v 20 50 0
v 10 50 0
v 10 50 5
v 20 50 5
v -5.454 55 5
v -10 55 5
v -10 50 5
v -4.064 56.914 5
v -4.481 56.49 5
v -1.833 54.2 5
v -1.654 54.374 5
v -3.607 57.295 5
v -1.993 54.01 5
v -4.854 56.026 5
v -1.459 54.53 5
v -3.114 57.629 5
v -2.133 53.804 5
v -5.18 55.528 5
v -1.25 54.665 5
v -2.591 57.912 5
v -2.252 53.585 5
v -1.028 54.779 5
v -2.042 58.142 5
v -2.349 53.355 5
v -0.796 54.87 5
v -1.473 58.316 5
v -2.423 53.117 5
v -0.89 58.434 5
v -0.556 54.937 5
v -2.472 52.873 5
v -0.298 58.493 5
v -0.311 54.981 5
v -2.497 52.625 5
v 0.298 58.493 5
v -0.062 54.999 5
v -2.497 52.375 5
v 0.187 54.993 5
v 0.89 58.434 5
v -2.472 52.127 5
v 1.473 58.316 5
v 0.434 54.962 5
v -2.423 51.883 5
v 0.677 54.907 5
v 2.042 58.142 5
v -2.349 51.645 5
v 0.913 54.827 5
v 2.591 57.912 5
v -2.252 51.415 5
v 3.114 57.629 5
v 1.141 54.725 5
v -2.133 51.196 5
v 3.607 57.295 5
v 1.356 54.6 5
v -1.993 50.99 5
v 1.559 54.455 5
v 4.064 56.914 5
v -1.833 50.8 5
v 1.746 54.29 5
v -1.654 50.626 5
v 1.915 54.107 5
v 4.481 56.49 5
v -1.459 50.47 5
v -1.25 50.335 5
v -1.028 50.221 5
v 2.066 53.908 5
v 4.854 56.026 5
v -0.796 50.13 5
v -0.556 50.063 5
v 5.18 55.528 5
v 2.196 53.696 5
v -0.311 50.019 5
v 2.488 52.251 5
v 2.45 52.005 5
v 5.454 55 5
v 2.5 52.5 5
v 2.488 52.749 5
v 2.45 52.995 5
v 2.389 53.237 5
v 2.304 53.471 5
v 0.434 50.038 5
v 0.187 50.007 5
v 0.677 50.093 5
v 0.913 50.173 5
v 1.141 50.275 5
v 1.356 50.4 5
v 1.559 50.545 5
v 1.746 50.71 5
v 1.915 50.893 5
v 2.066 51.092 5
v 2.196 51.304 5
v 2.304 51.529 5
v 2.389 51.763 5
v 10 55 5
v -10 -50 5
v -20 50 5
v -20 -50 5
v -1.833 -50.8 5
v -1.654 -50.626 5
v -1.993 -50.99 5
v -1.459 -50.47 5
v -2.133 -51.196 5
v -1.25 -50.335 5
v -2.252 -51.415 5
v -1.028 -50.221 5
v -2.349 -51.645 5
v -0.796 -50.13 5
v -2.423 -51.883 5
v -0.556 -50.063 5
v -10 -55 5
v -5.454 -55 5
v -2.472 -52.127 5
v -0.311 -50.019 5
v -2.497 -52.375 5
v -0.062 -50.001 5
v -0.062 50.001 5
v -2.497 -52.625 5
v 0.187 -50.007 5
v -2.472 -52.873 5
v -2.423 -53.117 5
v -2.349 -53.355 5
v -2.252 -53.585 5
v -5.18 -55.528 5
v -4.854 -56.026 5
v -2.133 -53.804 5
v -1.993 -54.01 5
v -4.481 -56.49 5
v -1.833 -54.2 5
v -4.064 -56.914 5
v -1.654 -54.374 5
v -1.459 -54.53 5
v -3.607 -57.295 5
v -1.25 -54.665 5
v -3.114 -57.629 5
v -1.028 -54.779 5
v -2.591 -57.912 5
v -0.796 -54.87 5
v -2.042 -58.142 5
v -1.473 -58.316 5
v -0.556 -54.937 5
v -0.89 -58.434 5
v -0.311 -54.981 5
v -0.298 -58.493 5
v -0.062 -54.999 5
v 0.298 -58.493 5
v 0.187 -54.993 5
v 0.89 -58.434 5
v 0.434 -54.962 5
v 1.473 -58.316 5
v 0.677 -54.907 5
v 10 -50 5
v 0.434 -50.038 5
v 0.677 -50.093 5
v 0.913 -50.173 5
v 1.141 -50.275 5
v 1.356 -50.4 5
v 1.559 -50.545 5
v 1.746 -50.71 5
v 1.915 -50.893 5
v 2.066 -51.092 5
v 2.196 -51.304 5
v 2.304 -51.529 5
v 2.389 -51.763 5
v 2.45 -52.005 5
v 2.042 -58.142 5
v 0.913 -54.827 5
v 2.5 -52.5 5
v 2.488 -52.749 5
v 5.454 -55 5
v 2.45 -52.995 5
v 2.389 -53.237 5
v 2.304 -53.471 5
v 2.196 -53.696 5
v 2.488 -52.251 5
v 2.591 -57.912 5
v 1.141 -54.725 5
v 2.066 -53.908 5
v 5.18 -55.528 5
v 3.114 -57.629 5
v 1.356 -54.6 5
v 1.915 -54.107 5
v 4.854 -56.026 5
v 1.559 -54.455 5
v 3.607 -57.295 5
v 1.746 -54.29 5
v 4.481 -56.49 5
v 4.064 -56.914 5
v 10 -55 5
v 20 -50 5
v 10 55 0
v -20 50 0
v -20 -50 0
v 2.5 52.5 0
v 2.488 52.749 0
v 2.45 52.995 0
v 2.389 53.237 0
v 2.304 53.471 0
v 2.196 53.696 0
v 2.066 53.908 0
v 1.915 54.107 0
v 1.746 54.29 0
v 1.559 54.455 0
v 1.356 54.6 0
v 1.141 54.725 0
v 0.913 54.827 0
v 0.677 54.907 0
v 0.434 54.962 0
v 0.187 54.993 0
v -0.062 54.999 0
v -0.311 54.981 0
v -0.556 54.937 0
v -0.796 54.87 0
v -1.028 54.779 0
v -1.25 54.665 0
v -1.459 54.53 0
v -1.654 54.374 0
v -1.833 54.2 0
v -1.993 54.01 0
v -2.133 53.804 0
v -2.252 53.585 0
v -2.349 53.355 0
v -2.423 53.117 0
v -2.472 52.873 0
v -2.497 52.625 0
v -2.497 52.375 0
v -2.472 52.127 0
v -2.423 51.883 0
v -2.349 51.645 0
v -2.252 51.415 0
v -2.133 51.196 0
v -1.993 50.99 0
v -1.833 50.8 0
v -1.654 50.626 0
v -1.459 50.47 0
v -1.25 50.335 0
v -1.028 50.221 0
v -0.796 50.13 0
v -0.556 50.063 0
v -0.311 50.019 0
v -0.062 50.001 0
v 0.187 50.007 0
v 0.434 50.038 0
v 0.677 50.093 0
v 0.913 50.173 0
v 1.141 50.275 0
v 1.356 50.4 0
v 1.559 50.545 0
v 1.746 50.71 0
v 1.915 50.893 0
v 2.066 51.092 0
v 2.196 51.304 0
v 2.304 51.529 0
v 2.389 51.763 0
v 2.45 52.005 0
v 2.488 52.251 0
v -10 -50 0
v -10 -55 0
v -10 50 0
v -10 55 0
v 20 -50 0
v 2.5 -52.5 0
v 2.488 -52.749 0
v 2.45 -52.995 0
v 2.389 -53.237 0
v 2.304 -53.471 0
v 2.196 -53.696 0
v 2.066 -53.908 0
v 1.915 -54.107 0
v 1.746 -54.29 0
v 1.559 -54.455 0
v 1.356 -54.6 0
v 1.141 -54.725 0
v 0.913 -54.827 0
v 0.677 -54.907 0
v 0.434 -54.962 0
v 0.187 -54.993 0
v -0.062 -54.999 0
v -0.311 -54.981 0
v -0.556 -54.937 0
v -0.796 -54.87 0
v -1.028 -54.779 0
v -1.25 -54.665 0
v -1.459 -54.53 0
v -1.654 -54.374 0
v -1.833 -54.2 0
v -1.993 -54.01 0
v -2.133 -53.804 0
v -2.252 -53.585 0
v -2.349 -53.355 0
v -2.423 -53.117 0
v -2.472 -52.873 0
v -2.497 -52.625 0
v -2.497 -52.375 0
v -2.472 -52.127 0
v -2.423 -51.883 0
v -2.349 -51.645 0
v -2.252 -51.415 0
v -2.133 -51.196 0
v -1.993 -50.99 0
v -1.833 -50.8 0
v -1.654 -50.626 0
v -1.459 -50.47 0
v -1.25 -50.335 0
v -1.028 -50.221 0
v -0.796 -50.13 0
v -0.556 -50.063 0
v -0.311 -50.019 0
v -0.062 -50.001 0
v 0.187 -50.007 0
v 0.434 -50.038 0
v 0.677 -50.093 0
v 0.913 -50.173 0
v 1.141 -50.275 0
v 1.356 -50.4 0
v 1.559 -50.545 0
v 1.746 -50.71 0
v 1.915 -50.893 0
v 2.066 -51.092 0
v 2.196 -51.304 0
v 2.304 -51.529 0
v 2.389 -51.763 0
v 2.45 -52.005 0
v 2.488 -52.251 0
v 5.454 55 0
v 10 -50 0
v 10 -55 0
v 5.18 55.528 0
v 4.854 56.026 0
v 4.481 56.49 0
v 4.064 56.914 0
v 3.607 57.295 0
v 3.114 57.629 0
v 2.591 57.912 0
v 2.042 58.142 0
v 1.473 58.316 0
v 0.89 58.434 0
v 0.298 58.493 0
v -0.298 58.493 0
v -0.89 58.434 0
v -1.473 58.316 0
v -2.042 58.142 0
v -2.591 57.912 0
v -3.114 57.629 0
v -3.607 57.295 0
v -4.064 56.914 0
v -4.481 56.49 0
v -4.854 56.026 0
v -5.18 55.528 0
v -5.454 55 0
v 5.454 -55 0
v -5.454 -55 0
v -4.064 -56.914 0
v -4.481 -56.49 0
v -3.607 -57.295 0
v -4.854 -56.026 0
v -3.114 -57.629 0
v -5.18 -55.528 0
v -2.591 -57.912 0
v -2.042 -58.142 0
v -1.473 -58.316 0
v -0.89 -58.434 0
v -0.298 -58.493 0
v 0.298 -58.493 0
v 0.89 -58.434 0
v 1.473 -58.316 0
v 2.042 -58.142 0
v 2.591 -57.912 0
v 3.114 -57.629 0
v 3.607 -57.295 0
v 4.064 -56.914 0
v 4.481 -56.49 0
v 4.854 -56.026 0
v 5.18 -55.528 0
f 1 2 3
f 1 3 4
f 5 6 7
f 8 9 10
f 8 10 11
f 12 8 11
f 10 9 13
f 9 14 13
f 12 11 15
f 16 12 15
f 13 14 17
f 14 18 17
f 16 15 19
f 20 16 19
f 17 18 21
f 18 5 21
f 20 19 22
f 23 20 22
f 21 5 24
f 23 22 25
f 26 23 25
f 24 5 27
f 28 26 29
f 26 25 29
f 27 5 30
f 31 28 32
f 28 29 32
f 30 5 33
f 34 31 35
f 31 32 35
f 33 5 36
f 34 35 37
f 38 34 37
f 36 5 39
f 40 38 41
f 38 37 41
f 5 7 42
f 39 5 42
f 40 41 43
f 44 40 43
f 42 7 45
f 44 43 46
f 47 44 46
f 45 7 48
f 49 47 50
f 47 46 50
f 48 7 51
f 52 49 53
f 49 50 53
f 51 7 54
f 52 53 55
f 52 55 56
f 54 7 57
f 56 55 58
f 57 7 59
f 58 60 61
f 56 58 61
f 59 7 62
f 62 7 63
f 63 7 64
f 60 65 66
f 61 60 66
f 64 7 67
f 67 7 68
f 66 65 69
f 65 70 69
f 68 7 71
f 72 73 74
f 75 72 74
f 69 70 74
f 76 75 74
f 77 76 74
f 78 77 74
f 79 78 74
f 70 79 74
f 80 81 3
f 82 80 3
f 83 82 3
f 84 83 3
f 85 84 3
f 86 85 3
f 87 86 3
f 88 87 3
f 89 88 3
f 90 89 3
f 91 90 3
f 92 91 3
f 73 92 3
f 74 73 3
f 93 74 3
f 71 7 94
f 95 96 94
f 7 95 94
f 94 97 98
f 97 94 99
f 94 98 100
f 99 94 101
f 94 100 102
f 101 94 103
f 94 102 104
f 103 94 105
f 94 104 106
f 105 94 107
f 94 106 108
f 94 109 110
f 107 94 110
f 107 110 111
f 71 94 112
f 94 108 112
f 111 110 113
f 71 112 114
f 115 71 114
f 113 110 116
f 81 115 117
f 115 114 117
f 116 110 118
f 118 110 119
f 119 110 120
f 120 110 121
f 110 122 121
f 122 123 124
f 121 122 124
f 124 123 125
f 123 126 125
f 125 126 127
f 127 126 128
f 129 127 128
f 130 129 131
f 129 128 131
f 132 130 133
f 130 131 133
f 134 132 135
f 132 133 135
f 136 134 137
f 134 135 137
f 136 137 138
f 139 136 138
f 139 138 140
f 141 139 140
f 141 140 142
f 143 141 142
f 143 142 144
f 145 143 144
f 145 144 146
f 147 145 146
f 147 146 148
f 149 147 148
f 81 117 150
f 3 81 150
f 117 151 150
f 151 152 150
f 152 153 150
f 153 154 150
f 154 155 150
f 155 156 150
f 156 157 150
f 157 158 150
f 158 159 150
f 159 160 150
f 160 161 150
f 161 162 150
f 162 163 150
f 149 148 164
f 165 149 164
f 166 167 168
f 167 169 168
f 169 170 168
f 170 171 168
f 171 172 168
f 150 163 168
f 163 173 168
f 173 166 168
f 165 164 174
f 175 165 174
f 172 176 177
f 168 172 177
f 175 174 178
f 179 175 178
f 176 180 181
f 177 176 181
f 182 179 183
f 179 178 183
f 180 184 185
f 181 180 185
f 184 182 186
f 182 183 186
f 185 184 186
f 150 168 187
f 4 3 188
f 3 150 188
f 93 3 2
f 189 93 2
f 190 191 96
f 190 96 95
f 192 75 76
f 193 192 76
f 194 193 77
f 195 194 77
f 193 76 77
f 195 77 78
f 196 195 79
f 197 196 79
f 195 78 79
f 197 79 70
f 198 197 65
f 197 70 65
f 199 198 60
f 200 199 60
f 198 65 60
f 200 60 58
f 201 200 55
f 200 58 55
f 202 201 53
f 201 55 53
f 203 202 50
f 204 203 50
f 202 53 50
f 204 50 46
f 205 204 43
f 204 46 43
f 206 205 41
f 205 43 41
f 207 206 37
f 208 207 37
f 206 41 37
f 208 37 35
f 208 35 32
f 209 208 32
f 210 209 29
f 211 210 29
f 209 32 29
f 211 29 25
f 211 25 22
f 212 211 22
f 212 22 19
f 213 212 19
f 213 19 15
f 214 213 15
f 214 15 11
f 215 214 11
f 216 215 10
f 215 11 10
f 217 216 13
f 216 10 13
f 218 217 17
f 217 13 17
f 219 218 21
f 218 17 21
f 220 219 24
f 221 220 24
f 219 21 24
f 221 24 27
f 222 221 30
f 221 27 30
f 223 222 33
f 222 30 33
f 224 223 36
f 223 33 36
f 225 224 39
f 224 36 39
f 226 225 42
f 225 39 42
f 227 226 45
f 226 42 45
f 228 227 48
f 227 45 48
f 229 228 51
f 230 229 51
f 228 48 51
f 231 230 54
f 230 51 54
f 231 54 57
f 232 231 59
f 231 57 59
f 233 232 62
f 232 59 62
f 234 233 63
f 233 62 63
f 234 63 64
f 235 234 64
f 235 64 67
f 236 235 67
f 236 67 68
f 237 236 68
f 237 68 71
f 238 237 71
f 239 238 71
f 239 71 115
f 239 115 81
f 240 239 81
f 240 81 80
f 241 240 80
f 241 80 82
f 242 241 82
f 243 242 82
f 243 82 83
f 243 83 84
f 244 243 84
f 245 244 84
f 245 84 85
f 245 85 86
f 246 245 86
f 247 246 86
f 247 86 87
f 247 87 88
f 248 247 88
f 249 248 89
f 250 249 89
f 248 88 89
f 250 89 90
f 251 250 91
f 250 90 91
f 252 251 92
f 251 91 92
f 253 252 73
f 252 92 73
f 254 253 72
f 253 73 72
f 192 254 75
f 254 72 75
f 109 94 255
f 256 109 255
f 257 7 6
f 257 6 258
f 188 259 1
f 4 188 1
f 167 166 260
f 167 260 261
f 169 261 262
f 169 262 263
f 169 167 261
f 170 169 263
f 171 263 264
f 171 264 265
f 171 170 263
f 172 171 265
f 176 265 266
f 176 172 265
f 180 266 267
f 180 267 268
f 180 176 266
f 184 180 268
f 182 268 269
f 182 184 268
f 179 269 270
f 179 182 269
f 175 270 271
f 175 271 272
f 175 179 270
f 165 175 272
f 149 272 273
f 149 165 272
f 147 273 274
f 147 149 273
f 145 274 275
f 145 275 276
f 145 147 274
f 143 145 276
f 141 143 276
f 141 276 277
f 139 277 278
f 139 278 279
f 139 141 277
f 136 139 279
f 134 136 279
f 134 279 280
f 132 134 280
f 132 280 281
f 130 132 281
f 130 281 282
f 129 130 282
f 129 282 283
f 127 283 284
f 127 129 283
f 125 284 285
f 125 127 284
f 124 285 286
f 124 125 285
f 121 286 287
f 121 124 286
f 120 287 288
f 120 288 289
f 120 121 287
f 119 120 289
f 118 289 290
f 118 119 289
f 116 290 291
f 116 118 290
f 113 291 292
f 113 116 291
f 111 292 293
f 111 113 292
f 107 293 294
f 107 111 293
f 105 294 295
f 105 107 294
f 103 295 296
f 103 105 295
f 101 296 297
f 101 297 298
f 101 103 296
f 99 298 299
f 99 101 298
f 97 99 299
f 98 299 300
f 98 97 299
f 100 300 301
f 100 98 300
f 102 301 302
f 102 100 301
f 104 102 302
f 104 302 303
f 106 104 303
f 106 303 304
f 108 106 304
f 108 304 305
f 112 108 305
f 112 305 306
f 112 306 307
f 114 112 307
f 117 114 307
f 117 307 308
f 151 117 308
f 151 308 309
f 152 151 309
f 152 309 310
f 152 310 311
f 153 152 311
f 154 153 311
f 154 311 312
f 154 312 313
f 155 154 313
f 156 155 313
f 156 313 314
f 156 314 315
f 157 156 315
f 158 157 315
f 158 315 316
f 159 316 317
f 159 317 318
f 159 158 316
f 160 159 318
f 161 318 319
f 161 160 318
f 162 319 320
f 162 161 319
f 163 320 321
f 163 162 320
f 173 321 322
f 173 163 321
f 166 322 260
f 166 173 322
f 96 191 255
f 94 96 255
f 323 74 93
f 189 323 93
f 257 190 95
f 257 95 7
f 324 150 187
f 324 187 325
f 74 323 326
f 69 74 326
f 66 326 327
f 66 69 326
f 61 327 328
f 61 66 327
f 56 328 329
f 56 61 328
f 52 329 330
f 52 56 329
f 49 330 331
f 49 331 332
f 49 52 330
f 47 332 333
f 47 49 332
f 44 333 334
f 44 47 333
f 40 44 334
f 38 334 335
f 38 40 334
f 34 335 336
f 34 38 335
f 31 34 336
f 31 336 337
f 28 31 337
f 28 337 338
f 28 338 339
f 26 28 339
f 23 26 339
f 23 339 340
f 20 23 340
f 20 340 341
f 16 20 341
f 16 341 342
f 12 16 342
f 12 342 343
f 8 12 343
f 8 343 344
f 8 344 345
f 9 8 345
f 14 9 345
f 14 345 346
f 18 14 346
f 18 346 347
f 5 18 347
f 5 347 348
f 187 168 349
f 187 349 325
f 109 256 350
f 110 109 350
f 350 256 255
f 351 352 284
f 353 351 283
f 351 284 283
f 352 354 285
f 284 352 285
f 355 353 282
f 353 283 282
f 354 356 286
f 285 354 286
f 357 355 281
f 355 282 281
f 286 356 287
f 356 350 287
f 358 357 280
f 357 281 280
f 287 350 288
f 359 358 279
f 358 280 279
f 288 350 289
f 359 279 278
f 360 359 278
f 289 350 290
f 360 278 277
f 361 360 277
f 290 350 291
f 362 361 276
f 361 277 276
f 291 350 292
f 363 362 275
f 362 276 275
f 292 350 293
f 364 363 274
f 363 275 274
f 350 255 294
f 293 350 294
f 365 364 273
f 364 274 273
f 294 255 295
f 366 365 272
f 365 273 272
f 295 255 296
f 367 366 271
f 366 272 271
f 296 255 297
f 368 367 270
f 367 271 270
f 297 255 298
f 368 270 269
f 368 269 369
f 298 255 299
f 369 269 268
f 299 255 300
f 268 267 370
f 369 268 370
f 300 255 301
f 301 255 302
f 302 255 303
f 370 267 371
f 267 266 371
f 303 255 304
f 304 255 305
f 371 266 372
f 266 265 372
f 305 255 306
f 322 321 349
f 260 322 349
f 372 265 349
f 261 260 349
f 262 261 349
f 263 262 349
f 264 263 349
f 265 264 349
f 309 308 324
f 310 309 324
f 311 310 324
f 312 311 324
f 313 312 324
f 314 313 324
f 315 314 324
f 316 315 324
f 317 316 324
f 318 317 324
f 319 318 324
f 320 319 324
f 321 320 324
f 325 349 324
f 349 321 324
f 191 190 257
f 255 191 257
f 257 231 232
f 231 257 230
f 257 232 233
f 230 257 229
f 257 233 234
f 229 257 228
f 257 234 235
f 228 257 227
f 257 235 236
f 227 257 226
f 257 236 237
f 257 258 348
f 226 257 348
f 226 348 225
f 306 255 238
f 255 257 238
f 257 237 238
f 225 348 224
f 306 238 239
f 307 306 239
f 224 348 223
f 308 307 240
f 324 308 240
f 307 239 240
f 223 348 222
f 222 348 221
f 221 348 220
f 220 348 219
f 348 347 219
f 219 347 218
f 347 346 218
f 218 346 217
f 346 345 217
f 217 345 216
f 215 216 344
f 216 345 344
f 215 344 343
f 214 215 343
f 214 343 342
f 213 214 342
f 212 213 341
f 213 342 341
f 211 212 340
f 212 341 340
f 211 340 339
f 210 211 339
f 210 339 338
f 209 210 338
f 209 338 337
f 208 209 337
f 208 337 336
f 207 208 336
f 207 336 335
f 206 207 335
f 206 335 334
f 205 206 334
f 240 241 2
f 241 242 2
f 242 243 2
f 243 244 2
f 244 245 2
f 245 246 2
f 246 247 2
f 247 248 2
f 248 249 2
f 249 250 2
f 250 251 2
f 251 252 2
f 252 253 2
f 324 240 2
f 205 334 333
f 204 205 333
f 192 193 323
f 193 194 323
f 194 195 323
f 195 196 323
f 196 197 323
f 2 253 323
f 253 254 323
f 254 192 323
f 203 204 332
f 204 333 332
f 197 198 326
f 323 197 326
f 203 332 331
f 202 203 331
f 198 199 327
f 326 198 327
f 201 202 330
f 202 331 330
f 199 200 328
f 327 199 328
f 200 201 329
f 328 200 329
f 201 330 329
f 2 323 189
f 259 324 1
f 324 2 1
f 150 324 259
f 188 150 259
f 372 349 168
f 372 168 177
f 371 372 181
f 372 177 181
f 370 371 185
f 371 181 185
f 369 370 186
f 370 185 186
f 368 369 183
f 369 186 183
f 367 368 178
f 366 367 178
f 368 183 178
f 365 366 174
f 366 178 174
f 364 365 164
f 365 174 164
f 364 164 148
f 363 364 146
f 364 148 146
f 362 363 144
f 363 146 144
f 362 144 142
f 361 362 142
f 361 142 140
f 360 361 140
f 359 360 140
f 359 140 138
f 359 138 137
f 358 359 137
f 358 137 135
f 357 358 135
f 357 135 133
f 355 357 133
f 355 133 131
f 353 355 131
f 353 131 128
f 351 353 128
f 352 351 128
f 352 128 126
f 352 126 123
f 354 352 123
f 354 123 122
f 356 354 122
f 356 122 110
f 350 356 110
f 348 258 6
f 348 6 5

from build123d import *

# Parameters (mm, degrees)
SKETCH1_W           = 40
SKETCH1_H           = 100
BOSS_EXTRUDE1_DEPTH = 5
SKETCH2_W           = 20
SKETCH2_H           = 5
BOSS_EXTRUDE2_DEPTH = 5
SKETCH3_R           = 6
BOSS_EXTRUDE3_DEPTH = 5
SKETCH4_R           = 2.5
CUT_EXTRUDE1_DEPTH  = 5


with BuildPart() as part:
    # Sketch1 → Boss-Extrude1 (new body)
    with BuildSketch(Plane.XY):
        Rectangle(SKETCH1_W, SKETCH1_H)
    extrude(amount=BOSS_EXTRUDE1_DEPTH)

    # Sketch2 → Boss-Extrude2 (add)
    with BuildSketch(Plane(origin=(0, 50, 0), x_dir=(1, 0, 0), z_dir=(0, 1, 0))):
        with Locations((0, -2.5)):
            Rectangle(SKETCH2_W, SKETCH2_H)
    boss_extrude2 = extrude(amount=BOSS_EXTRUDE2_DEPTH)

    # Mirror1: Boss-Extrude2 across plane
    add(boss_extrude2.mirror(Plane.ZX))

    # Sketch3 → Boss-Extrude3 (add)
    with BuildSketch(Plane.XY.offset(5)):
        with Locations((0, 52.5)):
            Circle(SKETCH3_R)
    boss_extrude3 = extrude(amount=-BOSS_EXTRUDE3_DEPTH)

    # Sketch4 → Cut-Extrude1 (cut)
    with BuildSketch(Plane.XY.offset(5)):
        with Locations((0, 52.5)):
            Circle(SKETCH4_R)
    cut_extrude1 = extrude(amount=-CUT_EXTRUDE1_DEPTH, mode=Mode.SUBTRACT)

    # Mirror2: Boss-Extrude3, Cut-Extrude1 across plane
    add(boss_extrude3.mirror(Plane.ZX))
    add(cut_extrude1.mirror(Plane.ZX), mode=Mode.SUBTRACT)


solid = part.part
